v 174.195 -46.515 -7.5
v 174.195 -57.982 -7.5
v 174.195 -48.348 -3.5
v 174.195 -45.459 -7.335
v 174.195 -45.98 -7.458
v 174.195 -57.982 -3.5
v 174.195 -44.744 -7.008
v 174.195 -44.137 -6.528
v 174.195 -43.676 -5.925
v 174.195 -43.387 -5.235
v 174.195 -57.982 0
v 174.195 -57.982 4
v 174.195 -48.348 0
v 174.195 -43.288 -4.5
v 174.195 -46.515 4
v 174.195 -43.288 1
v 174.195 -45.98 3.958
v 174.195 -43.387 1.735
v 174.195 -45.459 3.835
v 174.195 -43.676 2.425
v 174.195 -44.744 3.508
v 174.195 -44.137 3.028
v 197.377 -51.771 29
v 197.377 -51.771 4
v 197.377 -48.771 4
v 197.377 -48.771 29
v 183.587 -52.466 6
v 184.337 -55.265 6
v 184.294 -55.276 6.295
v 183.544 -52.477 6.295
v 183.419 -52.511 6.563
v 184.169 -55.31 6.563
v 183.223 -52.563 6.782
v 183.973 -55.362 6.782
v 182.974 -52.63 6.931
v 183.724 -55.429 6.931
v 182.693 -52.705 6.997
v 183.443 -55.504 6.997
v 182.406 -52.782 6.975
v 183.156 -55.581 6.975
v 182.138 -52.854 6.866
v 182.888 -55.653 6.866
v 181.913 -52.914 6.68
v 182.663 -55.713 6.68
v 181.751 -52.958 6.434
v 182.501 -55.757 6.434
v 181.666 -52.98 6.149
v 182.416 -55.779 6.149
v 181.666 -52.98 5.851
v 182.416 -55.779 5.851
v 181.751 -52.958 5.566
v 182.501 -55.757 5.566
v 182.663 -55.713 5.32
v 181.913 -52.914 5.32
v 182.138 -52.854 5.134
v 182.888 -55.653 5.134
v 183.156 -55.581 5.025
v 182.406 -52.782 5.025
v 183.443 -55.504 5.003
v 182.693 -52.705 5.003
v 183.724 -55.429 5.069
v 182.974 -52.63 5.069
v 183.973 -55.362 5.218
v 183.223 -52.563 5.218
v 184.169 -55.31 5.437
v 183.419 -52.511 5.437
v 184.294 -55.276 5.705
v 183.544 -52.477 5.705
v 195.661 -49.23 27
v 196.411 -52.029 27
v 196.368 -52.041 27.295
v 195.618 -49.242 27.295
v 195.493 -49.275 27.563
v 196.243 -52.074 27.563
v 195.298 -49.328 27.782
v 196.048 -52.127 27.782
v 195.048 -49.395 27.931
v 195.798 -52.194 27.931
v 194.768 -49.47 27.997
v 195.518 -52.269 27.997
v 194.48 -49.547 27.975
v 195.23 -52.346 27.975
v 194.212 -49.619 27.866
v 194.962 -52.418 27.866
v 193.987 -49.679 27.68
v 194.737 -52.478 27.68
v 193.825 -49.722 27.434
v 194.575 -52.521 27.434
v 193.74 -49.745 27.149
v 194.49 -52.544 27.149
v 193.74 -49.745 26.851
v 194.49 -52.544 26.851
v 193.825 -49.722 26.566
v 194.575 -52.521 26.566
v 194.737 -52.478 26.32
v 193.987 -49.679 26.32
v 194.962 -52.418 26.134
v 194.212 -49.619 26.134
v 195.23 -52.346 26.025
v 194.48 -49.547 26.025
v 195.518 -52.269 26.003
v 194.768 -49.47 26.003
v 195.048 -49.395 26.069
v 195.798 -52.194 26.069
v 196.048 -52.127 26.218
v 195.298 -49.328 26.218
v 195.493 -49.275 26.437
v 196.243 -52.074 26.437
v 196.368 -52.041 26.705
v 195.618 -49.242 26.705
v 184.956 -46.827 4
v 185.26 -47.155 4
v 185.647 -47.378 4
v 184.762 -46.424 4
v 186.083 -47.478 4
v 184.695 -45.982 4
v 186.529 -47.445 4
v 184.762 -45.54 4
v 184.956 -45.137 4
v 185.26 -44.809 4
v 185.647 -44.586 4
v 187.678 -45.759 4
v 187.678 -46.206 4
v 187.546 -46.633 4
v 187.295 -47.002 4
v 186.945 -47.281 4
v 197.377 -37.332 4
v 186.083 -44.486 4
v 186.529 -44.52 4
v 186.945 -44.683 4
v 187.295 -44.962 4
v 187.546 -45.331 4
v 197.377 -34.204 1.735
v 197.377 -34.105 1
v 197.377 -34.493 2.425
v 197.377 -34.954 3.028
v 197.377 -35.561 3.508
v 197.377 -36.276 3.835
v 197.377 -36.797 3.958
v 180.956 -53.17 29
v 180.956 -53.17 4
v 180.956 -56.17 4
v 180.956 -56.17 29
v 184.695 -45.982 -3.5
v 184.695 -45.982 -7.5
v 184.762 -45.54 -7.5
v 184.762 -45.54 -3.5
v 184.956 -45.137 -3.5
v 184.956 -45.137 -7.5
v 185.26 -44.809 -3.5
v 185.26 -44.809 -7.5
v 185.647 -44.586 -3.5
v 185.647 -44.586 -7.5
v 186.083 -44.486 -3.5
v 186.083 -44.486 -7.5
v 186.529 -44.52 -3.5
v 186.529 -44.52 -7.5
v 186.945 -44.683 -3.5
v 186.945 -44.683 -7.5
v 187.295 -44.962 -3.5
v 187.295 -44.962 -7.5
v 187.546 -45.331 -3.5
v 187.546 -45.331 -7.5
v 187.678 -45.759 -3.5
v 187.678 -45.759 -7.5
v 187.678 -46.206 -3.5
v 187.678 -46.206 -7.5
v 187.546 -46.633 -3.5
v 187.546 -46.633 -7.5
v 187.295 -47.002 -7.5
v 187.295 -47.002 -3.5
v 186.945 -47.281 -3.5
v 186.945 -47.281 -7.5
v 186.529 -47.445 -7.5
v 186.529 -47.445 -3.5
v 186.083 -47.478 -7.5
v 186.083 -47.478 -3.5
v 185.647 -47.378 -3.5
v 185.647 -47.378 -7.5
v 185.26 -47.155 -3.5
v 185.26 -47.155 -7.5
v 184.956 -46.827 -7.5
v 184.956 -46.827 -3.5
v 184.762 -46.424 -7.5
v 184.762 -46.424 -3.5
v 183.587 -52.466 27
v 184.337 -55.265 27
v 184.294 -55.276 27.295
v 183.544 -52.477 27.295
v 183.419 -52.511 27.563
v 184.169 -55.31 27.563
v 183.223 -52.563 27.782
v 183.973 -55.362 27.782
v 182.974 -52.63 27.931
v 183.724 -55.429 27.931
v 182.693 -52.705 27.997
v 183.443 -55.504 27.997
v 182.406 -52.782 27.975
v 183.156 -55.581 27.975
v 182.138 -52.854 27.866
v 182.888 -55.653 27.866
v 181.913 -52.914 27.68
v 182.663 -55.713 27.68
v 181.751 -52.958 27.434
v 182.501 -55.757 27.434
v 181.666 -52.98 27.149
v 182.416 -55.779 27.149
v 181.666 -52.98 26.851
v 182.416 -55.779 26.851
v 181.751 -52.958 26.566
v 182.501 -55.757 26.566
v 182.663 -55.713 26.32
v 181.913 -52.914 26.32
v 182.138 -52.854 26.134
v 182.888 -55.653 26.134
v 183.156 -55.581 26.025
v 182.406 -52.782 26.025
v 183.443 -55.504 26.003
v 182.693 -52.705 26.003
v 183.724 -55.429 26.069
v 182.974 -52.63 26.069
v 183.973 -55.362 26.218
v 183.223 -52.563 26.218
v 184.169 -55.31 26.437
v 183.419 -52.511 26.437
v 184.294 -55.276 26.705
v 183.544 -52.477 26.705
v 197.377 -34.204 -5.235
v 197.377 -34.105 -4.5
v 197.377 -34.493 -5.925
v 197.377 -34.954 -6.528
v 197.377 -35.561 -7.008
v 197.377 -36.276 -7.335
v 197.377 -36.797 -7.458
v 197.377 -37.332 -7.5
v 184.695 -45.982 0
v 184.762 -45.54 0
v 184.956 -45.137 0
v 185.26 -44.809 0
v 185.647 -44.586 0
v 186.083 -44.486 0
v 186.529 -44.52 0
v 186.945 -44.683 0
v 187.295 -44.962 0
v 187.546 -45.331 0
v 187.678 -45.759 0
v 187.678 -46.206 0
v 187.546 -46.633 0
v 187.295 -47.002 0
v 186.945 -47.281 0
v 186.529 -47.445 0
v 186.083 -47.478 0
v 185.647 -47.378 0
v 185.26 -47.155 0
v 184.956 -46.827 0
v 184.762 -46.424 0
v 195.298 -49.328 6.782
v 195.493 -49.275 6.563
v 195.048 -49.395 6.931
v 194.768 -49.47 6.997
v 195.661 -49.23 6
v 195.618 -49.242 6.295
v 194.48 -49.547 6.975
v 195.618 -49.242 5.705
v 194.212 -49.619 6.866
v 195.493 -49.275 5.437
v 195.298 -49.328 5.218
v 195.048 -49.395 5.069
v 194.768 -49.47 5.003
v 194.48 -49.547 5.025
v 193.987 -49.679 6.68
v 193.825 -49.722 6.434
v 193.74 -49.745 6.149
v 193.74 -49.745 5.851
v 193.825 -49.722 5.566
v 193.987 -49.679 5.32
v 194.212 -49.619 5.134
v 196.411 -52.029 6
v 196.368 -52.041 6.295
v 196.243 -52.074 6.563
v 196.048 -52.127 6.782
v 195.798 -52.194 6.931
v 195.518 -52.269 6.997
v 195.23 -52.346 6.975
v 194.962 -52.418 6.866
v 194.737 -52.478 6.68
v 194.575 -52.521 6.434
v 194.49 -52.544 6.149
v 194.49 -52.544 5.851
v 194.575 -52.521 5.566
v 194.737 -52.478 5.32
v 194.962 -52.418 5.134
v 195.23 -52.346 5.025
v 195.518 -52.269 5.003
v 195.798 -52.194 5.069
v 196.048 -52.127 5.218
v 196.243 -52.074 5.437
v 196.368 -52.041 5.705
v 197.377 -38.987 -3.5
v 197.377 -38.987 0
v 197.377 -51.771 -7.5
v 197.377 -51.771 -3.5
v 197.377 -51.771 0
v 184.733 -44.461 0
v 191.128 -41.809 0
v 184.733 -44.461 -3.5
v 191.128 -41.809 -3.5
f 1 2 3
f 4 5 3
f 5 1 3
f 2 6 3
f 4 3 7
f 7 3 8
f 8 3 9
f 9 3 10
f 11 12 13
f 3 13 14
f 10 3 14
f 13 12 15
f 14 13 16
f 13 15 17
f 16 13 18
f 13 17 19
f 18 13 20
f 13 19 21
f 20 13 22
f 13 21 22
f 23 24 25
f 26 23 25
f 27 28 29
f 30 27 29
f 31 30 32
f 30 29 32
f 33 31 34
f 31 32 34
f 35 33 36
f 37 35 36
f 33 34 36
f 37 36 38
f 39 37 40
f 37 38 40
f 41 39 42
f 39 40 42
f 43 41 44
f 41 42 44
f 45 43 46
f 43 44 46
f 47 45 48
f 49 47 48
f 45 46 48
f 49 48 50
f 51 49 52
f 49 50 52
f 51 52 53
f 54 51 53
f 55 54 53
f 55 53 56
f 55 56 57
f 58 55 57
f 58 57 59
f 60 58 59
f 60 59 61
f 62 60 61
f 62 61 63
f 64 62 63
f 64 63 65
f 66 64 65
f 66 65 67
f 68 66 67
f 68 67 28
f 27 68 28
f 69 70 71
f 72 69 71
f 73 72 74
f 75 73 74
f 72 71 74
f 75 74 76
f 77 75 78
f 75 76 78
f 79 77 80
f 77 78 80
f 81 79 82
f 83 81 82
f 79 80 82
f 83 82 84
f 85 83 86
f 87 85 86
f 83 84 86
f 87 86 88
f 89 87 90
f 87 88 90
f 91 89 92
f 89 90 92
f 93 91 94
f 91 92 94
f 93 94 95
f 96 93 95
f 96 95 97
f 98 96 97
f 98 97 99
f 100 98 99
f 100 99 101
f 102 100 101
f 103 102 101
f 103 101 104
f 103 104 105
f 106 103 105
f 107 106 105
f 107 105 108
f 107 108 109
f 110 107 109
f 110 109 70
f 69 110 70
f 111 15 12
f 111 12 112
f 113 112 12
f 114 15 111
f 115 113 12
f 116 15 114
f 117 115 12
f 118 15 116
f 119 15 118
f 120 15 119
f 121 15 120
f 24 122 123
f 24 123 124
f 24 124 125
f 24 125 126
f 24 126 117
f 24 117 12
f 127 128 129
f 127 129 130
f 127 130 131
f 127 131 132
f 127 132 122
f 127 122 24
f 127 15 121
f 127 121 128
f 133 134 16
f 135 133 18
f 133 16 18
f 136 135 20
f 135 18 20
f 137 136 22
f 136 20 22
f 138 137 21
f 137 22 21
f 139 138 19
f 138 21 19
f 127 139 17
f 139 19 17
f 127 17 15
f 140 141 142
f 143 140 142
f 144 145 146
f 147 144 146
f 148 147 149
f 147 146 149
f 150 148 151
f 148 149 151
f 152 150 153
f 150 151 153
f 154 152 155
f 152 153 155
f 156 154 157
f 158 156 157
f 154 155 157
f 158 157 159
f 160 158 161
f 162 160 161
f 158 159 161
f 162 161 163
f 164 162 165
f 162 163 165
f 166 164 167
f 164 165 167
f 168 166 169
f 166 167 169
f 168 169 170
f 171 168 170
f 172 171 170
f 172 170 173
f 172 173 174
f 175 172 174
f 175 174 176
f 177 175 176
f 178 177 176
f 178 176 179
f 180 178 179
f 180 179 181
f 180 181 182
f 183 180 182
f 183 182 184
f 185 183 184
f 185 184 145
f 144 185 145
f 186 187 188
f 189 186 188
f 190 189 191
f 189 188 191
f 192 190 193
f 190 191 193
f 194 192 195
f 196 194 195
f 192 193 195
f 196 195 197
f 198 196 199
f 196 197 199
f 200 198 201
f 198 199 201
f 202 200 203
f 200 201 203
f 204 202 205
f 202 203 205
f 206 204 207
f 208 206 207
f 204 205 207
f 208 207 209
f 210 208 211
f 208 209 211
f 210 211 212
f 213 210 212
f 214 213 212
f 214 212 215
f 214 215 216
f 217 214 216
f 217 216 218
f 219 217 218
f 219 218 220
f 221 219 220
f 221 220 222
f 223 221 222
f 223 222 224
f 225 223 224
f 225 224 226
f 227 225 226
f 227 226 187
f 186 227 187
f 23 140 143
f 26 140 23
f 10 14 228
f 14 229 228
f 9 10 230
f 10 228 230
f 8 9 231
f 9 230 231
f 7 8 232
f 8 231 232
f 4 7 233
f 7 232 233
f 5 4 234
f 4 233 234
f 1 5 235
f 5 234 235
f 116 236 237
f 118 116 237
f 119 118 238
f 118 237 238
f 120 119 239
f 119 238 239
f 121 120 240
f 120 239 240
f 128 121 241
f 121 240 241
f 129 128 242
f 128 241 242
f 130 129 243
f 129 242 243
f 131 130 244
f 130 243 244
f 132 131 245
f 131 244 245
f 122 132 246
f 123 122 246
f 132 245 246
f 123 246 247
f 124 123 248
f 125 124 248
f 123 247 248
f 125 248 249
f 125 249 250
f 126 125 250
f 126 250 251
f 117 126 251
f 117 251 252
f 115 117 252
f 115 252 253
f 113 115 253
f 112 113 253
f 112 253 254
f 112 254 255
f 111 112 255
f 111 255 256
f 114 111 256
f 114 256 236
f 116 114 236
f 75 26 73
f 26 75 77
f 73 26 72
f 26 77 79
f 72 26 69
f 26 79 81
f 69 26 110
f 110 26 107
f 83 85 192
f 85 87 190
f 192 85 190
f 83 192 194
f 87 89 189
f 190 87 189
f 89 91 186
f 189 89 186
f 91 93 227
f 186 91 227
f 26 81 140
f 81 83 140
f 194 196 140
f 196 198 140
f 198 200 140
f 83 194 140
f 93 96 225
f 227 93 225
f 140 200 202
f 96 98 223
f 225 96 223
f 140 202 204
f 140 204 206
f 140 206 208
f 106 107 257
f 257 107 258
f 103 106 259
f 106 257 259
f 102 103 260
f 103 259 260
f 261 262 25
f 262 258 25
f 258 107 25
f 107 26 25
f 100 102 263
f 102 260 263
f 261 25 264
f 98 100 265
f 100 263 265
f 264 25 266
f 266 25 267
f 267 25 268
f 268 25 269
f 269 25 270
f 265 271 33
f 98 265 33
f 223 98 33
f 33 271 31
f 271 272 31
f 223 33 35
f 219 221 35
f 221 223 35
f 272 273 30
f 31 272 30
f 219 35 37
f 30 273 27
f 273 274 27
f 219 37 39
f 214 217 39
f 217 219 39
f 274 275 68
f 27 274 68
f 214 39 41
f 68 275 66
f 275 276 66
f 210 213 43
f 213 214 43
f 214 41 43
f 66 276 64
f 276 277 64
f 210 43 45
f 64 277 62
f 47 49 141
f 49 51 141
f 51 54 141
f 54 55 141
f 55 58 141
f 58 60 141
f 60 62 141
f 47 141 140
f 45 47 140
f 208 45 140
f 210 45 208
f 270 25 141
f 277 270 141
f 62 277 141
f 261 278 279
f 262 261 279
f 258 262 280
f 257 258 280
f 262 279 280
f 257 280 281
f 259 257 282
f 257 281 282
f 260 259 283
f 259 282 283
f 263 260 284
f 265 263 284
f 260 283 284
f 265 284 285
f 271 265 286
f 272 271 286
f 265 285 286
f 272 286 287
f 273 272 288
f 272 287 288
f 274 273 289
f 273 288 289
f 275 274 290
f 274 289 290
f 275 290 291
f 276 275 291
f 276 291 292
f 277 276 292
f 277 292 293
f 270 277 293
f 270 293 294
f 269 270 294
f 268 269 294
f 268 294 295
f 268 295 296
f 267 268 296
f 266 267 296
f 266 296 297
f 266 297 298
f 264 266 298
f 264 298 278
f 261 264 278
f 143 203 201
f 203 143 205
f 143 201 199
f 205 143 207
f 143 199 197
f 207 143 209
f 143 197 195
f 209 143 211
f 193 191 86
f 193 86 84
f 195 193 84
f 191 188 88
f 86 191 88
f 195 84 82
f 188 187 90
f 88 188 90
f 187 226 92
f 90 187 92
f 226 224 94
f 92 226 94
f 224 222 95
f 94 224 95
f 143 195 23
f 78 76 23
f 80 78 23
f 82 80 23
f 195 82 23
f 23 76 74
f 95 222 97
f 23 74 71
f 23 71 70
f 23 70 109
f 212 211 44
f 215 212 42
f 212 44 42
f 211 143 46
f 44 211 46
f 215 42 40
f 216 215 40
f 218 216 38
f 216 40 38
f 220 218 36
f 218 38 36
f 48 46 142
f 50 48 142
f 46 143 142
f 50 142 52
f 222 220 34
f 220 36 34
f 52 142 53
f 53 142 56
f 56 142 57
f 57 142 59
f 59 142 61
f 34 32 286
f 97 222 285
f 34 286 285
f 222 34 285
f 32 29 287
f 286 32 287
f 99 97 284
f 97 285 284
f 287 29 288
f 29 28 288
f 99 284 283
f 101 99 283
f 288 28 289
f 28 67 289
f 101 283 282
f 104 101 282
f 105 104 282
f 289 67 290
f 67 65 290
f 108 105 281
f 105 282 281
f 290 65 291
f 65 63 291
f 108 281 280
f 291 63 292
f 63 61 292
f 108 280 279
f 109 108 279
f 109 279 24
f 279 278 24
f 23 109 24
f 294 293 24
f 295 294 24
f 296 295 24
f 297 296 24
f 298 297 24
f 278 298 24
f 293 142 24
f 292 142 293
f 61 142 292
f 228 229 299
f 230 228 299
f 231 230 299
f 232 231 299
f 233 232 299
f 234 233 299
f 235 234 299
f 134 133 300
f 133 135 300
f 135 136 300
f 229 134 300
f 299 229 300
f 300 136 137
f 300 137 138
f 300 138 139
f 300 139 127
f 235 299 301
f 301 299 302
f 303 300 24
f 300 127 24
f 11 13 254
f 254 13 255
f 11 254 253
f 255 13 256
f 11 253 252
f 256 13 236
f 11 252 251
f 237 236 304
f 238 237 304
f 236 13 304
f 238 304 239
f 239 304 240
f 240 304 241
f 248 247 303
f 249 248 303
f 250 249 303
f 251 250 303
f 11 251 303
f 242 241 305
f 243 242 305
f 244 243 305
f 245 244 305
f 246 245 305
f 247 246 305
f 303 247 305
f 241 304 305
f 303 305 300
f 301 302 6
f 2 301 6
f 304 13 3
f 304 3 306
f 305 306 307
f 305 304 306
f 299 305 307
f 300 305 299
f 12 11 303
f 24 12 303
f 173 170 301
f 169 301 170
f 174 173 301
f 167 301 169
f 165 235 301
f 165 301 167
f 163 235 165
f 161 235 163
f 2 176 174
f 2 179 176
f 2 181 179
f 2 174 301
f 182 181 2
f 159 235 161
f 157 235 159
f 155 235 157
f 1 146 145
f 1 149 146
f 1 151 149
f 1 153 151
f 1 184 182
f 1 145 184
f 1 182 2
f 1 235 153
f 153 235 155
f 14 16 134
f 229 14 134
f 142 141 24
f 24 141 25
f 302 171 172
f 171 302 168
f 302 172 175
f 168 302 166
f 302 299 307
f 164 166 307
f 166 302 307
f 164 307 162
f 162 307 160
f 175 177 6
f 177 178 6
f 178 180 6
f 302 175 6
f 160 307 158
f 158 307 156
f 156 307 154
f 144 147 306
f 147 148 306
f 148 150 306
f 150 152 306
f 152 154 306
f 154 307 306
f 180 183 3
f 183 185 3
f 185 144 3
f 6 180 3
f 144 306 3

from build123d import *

# Parameters (mm, degrees)
BOSS_EXTRUDE1_DEPTH = 4
BOSS_EXTRUDE2_DEPTH = 25
SKETCH3_R           = 1
CUT_EXTRUDE1_DEPTH  = 34
BOSS_EXTRUDE3_DEPTH = 3.5
BOSS_EXTRUDE4_DEPTH = 4
SKETCH6_R           = 1.5
CUT_EXTRUDE2_DEPTH  = 34
FILLET1_R           = 3


with BuildPart() as part:
    # Sketch1 → Boss-Extrude1 (new body)
    with BuildSketch(Plane.XY):
        Polygon((174.194954223, -57.982184222), (197.377174054, -51.77052714), (197.377174054, -38.986921501), (197.377174054, -34.105402396), (174.194954223, -43.288438949), (174.194954223, -48.347554222), align=None)
    extrude(amount=BOSS_EXTRUDE1_DEPTH)

    # Sketch4 → Boss-Extrude3 (add)
    with BuildSketch(Plane(origin=(0, 0, 0), x_dir=(-1, 0, 0), z_dir=(0, 0, -1))):
        with BuildLine():
            Line((-174.194954223, -43.288438949), (-197.377174054, -34.105402396))
            Line((-197.377174054, -34.105402396), (-197.377174054, -38.986921501))
            add(Edge.make_bspline(
                [(-174.194954249, -48.347554214), (-177.589879135, -47.187067023), (-184.430668648, -44.673129126), (-192.066227253, -41.446744094), (-196.375700505, -39.45835727), (-197.377174056, -38.9869215)],
                knots=[0.498230043, 0.498230043, 0.498230043, 0.498230043, 0.498491185, 0.49876541, 0.498849046, 0.498849046, 0.498849046, 0.498849046], degree=3))
            Line((-174.194954223, -48.347554222), (-174.194954223, -43.288438949))
        make_face()
    extrude(amount=BOSS_EXTRUDE3_DEPTH)

    # Sketch5 → Boss-Extrude4 (add)
    with BuildSketch(Plane(origin=(0, 0, -3.5), x_dir=(-1, 0, 0), z_dir=(0, 0, -1))):
        Polygon((-174.194954223, -43.288438949), (-197.377174054, -34.105402396), (-197.377174054, -51.77052714), (-174.194954223, -57.982184222), align=None)
    extrude(amount=BOSS_EXTRUDE4_DEPTH)

    # Sketch6 → Cut-Extrude2 (cut)
    with BuildSketch(Plane(origin=(0, 0, -7.5), x_dir=(-1, 0, 0), z_dir=(0, 0, -1))):
        with Locations((-186.194954223, -45.982184222)):
            Circle(SKETCH6_R)
    extrude(amount=-CUT_EXTRUDE2_DEPTH, mode=Mode.SUBTRACT)

    # Fillet1
    fillet1_edges = [part.edges().sort_by_distance(p)[0] for p in [
        (185.786064138, -38.696920673, -7.5),
        (185.786064138, -38.696920673, 4),
    ]]
    fillet(fillet1_edges, radius=FILLET1_R)


with BuildPart() as body_2:
    # Sketch2 → Boss-Extrude2 (new body)
    with BuildSketch(Plane.XY.offset(4)):
        Polygon((197.377174054, -51.77052714), (197.377174054, -48.77052714), (180.956435007, -53.170450907), (180.956435007, -56.170450907), align=None)
    extrude(amount=BOSS_EXTRUDE2_DEPTH)

    # Sketch3 → Cut-Extrude1 (cut)
    with BuildSketch(Plane(origin=(26.164395383, -97.646852919, 0), x_dir=(0.9659258262890655, 0.25881904510253134, 0), z_dir=(0.2588190451025313, -0.9659258262890654, 0))):
        with Locations((162.75251154, 6)):
            Circle(SKETCH3_R)
        with Locations((162.75251154, 27)):
            Circle(SKETCH3_R)
        with Locations((175.25251154, 6)):
            Circle(SKETCH3_R)
        with Locations((175.25251154, 27)):
            Circle(SKETCH3_R)
    extrude(amount=-CUT_EXTRUDE1_DEPTH, mode=Mode.SUBTRACT)


solid = Compound([part.part, body_2.part])
